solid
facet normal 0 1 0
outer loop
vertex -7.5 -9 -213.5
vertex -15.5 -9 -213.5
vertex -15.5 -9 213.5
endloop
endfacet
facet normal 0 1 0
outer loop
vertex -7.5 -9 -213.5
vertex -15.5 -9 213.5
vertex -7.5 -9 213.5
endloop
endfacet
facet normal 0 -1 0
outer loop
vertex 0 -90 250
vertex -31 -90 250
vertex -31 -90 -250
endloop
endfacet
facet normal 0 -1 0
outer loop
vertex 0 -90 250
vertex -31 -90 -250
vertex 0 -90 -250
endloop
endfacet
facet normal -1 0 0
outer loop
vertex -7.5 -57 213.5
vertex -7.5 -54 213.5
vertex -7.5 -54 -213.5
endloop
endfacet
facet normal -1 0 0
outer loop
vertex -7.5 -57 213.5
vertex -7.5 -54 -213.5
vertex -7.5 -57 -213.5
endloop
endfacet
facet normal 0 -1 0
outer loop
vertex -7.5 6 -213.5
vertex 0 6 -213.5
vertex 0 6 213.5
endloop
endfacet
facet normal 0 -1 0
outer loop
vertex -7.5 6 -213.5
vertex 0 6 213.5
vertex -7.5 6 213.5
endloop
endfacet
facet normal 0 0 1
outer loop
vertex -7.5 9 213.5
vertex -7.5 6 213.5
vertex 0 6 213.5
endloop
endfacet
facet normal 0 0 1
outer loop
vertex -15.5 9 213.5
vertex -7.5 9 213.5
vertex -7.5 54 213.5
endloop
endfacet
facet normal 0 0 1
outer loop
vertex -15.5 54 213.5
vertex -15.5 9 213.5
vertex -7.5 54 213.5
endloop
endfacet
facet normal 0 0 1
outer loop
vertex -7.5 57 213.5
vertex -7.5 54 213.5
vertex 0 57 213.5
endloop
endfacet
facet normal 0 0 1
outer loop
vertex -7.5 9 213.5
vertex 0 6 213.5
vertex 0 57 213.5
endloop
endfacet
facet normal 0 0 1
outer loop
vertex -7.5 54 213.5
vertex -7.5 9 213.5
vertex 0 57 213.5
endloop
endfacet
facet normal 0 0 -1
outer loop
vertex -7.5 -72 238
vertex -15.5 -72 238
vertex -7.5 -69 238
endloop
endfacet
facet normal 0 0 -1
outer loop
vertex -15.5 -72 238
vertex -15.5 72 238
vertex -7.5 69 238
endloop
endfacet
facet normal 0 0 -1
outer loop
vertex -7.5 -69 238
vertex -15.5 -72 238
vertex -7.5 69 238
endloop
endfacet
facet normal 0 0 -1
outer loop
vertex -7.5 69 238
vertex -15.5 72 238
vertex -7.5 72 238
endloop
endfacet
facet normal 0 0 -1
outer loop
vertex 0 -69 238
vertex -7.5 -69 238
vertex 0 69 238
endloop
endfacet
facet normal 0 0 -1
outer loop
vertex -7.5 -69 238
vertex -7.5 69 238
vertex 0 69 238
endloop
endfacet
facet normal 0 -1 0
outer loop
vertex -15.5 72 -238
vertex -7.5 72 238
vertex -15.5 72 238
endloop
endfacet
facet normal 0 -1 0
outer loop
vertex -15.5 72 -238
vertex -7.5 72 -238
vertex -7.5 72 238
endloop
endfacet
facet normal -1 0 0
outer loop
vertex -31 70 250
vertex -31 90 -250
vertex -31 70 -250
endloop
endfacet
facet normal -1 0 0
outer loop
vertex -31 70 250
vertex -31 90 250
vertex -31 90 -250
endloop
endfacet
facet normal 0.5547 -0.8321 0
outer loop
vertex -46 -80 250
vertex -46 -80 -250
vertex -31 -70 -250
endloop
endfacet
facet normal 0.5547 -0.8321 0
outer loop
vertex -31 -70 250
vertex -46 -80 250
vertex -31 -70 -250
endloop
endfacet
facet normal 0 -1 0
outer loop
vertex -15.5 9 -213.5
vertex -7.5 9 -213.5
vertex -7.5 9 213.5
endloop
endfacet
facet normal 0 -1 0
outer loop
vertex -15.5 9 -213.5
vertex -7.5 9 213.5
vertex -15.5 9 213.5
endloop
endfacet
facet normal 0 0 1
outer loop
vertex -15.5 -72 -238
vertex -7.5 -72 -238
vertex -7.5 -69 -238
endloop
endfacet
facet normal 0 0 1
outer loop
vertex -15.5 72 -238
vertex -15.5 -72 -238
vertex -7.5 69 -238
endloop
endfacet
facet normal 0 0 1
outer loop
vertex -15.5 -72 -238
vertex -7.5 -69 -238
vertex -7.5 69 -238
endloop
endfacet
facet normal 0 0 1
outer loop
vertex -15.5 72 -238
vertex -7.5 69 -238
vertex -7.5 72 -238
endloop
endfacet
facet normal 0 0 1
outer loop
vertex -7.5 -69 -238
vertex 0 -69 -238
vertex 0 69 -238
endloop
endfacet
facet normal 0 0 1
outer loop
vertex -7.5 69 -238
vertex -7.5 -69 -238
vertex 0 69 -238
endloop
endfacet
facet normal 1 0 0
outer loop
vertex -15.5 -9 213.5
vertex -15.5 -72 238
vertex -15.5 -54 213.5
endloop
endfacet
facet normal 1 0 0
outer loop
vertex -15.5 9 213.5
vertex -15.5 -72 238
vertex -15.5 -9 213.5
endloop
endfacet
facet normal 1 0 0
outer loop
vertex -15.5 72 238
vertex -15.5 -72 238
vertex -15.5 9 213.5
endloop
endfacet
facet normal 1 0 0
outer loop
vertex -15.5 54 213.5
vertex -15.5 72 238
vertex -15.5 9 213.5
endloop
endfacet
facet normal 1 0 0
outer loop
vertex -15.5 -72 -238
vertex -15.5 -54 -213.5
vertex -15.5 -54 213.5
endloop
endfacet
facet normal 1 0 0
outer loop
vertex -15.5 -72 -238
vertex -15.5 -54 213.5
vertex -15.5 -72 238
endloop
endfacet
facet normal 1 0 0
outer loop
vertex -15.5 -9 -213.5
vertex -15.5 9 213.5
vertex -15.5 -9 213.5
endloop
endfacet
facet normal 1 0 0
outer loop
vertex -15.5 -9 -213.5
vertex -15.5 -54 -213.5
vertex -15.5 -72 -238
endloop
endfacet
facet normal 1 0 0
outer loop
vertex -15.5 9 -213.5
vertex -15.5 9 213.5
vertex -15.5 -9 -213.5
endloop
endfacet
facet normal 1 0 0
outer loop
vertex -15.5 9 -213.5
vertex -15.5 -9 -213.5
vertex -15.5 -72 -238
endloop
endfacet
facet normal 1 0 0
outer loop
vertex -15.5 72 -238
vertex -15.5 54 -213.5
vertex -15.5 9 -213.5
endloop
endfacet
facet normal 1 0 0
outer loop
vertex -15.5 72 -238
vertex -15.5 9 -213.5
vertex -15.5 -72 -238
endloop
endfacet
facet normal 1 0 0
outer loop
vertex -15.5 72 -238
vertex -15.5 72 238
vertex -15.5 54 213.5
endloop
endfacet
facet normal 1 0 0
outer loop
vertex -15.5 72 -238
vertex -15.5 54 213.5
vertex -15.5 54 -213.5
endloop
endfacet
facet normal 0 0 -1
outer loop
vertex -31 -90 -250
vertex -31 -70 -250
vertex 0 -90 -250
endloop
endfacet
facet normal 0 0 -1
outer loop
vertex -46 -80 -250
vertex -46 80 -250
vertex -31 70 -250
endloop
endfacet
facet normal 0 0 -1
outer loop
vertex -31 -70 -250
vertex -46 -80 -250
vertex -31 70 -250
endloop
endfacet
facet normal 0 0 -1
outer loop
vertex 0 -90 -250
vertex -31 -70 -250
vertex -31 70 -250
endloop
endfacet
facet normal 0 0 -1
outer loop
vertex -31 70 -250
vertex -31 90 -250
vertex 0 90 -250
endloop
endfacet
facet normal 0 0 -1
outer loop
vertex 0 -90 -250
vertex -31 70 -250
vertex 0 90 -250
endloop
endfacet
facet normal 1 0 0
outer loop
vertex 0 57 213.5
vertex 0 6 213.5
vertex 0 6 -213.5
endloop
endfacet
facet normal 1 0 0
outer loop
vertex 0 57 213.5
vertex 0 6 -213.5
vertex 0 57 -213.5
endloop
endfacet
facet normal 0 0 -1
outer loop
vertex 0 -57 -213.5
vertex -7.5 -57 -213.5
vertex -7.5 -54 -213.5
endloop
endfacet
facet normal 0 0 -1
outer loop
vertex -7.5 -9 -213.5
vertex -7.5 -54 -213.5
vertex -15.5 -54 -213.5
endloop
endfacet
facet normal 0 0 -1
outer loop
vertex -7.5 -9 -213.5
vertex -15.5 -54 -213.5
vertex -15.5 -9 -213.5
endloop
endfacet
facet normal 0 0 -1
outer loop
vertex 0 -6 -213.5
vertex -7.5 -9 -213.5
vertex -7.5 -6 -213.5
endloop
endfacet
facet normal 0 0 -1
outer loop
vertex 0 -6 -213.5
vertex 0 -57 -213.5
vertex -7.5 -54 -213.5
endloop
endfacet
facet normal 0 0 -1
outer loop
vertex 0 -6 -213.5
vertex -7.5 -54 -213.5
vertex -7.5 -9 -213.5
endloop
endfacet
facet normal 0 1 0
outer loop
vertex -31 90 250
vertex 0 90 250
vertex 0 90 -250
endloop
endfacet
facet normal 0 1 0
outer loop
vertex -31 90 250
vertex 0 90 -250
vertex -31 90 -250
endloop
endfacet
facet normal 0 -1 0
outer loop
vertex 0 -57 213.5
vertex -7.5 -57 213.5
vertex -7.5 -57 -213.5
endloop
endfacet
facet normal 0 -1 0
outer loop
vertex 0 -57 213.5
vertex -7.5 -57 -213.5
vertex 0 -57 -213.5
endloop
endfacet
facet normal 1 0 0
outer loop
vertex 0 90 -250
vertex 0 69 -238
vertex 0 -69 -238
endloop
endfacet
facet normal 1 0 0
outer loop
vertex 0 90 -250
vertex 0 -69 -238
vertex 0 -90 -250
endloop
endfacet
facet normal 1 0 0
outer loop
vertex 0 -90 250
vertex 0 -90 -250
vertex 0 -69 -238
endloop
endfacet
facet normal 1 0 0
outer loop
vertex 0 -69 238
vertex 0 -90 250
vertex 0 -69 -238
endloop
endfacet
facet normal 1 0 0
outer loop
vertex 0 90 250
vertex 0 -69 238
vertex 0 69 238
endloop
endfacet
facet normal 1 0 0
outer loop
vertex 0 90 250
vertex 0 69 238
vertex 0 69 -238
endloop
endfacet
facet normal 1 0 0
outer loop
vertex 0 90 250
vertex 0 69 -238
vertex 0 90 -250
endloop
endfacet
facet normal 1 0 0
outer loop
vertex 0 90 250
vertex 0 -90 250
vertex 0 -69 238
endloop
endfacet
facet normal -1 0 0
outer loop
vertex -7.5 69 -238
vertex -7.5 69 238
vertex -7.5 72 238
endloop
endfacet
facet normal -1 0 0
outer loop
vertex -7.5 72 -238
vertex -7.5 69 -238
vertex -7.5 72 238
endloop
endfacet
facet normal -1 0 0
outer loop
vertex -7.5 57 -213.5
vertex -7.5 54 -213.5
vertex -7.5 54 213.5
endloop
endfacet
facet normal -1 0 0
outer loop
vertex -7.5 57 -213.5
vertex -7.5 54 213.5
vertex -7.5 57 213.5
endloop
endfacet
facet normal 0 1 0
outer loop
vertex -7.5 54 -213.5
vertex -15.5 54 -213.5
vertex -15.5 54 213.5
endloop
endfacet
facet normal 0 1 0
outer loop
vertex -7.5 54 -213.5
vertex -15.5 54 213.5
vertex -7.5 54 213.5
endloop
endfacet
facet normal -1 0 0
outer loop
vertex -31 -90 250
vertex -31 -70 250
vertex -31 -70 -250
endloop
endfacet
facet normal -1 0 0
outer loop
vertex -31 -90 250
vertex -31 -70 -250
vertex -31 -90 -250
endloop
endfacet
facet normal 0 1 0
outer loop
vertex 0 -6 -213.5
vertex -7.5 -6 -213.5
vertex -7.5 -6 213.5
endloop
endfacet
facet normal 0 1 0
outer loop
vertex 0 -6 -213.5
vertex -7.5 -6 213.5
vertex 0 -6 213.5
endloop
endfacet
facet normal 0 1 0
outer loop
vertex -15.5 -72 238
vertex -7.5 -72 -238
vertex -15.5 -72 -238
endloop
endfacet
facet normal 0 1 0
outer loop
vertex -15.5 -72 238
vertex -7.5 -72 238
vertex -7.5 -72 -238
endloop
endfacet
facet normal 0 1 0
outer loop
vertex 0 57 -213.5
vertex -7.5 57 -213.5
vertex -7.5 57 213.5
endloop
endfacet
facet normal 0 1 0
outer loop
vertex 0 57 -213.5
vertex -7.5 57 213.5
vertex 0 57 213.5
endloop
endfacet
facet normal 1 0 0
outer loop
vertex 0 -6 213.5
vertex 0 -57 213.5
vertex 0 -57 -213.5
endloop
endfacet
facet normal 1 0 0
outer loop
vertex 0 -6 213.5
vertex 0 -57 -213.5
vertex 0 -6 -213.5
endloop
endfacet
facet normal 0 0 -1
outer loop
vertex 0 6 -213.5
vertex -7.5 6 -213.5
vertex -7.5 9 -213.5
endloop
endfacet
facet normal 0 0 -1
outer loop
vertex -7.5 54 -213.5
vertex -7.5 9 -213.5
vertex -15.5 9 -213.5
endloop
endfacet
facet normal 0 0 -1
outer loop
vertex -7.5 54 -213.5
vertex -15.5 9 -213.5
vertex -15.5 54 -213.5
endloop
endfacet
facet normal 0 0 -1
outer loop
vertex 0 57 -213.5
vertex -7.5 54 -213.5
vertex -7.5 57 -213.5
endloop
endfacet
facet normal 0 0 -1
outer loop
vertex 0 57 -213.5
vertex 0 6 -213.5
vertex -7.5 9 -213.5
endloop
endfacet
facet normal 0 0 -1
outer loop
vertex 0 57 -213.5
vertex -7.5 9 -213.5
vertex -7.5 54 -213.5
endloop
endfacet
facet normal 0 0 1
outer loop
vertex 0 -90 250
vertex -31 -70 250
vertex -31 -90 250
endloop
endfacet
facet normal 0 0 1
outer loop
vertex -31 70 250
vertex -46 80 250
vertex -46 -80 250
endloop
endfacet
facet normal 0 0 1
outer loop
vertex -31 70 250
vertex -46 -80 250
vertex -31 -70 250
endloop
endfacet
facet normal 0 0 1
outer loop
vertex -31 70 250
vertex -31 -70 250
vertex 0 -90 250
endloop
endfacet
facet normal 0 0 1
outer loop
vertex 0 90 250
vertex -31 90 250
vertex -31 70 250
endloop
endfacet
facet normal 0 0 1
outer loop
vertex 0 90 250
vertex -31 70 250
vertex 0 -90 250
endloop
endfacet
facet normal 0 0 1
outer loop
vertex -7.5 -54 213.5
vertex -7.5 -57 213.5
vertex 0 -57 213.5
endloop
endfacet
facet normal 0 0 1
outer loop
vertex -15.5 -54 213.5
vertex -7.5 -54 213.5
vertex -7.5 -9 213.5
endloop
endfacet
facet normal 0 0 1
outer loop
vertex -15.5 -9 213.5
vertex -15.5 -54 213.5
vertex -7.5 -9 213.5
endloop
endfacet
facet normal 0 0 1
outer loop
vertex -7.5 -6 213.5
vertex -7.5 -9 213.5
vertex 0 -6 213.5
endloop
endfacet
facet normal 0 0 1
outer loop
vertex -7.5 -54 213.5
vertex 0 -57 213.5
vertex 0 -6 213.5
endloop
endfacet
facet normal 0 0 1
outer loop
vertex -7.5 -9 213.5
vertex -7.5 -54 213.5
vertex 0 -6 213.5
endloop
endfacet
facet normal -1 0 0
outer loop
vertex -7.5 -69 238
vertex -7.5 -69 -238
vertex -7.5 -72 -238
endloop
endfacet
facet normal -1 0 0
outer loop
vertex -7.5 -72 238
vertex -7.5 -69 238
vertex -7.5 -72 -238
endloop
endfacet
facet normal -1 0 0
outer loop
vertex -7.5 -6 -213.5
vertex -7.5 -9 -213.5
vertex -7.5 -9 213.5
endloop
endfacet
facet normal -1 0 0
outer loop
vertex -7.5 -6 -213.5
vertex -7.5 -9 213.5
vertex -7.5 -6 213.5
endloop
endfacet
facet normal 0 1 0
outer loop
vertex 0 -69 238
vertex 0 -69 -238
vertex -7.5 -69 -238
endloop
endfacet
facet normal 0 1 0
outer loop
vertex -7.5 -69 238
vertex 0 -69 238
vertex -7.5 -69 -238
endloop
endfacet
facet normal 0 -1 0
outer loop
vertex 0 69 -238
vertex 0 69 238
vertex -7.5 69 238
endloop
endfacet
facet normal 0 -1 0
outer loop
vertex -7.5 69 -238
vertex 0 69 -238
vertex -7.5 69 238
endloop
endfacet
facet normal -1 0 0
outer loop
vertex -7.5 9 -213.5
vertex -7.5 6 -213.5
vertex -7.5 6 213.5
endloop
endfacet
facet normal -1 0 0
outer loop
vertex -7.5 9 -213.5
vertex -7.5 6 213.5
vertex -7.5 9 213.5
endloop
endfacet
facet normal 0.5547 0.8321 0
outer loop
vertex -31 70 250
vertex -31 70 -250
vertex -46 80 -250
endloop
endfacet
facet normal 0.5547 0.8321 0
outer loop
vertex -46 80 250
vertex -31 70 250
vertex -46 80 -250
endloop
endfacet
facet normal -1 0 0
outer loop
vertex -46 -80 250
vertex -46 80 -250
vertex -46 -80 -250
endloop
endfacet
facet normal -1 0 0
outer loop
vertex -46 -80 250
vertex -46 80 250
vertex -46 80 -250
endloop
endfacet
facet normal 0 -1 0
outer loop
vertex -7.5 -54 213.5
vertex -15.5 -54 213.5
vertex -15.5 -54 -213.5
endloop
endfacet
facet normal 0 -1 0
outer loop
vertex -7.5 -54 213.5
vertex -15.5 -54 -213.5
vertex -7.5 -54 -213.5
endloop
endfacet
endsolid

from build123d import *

# Parameters (mm, degrees)
BOSS_EXTRUDE1_DEPTH = 250
CUT_EXTRUDE1_DEPTH  = 238
SKETCH3_W           = 24.5
SKETCH3_H           = 138
CUT_EXTRUDE2_DEPTH  = 15.5


with BuildPart() as part:
    # Sketch1 → Boss-Extrude1 (new body, symmetric)
    with BuildSketch(Plane.XY):
        Polygon((-46, 80), (-46, -80), (-31, -70), (-31, -90), (0, -90), (0, 90), (-31, 90), (-31, 70), align=None)
    extrude(amount=BOSS_EXTRUDE1_DEPTH, both=True)

    # Sketch2 → Cut-Extrude1 (cut, symmetric)
    with BuildSketch(Plane.XY):
        Polygon((0, 69), (-7.5, 69), (-7.5, 72), (-15.5, 72), (-15.5, 54), (-7.5, 54), (-7.5, 57), (0, 57), align=None)
        Polygon((0, 6), (-7.5, 6), (-7.5, 9), (-15.5, 9), (-15.5, -9), (-7.5, -9), (-7.5, -6), (0, -6), align=None)
        Polygon((0, -69), (-7.5, -69), (-7.5, -72), (-15.5, -72), (-15.5, -54), (-7.5, -54), (-7.5, -57), (0, -57), align=None)
    extrude(amount=CUT_EXTRUDE1_DEPTH, both=True, mode=Mode.SUBTRACT)

    # Sketch3 → Cut-Extrude2 (cut)
    with BuildSketch(Plane(origin=(0, 0, 0), x_dir=(0, 0, -1), z_dir=(1, 0, 0))):
        with Locations((-225.75, 0)):
            Rectangle(SKETCH3_W, SKETCH3_H)
        with Locations((225.75, 0)):
            Rectangle(SKETCH3_W, SKETCH3_H)
    extrude(amount=-CUT_EXTRUDE2_DEPTH, mode=Mode.SUBTRACT)


solid = part.part
